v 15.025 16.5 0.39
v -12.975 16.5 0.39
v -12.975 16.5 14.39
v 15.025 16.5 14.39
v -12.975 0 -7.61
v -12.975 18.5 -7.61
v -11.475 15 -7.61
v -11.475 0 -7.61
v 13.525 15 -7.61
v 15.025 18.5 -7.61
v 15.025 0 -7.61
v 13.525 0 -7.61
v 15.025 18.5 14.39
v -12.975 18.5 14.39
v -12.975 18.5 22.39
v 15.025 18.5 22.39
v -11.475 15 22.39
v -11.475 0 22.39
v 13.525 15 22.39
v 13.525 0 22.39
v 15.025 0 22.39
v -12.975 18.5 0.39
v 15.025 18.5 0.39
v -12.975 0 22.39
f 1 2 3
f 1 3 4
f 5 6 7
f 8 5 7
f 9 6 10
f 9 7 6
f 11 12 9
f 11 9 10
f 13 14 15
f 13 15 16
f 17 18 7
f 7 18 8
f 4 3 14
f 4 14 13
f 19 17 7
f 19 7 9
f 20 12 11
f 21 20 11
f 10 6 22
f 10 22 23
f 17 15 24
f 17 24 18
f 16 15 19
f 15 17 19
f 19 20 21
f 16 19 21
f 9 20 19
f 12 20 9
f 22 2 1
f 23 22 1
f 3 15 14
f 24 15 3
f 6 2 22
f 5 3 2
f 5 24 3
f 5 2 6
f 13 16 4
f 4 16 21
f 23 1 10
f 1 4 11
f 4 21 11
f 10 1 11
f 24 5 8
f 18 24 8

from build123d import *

# Parameters (mm, degrees)
SKETCH1_W             = 1.5
SKETCH1_H             = 30
BOSS_EXTRUDE1_DEPTH   = 15
BOSS_EXTRUDE1_2_DEPTH = 15
SKETCH4_W             = 28
SKETCH4_H             = 30
BOSS_EXTRUDE2_DEPTH   = 1.5
SKETCH5_W             = 28
SKETCH5_H             = 8
BOSS_EXTRUDE3_DEPTH   = 2


with BuildPart() as part:
    # Sketch1 → Boss-Extrude1 (new body)
    with BuildSketch(Plane(origin=(0, 0, 0), x_dir=(1, 0, 0), z_dir=(0, 1, 0))):
        with Locations((-12.224763407, -7.389589905)):
            Rectangle(SKETCH1_W, SKETCH1_H)
    extrude(amount=BOSS_EXTRUDE1_DEPTH)



with BuildPart() as body_2:
    # Sketch1 → Boss-Extrude1 2 (new body)
    with BuildSketch(Plane(origin=(0, 0, 0), x_dir=(1, 0, 0), z_dir=(0, 1, 0))):
        with Locations((14.275236593, -7.389589905)):
            Rectangle(SKETCH1_W, SKETCH1_H)
    extrude(amount=BOSS_EXTRUDE1_2_DEPTH)


with BuildPart() as part_1:
    add(part.part)

    add(body_2.part)  # Boss-Extrude2 merges body 2
    # Sketch4 → Boss-Extrude2 (add)
    with BuildSketch(Plane(origin=(0, 15, 0), x_dir=(1, 0, 0), z_dir=(0, 1, 0))):
        with Locations((1.025236593, -7.389589905)):
            Rectangle(SKETCH4_W, SKETCH4_H)
    extrude(amount=BOSS_EXTRUDE2_DEPTH)

    # Sketch5 → Boss-Extrude3 (add)
    with BuildSketch(Plane(origin=(0, 16.5, 0), x_dir=(1, 0, 0), z_dir=(0, 1, 0))):
        with Locations((1.025236593, 3.610410095)):
            Rectangle(SKETCH5_W, SKETCH5_H)
        with Locations((1.025236593, -18.389589905)):
            Rectangle(SKETCH5_W, SKETCH5_H)
    extrude(amount=BOSS_EXTRUDE3_DEPTH)


solid = part_1.part
